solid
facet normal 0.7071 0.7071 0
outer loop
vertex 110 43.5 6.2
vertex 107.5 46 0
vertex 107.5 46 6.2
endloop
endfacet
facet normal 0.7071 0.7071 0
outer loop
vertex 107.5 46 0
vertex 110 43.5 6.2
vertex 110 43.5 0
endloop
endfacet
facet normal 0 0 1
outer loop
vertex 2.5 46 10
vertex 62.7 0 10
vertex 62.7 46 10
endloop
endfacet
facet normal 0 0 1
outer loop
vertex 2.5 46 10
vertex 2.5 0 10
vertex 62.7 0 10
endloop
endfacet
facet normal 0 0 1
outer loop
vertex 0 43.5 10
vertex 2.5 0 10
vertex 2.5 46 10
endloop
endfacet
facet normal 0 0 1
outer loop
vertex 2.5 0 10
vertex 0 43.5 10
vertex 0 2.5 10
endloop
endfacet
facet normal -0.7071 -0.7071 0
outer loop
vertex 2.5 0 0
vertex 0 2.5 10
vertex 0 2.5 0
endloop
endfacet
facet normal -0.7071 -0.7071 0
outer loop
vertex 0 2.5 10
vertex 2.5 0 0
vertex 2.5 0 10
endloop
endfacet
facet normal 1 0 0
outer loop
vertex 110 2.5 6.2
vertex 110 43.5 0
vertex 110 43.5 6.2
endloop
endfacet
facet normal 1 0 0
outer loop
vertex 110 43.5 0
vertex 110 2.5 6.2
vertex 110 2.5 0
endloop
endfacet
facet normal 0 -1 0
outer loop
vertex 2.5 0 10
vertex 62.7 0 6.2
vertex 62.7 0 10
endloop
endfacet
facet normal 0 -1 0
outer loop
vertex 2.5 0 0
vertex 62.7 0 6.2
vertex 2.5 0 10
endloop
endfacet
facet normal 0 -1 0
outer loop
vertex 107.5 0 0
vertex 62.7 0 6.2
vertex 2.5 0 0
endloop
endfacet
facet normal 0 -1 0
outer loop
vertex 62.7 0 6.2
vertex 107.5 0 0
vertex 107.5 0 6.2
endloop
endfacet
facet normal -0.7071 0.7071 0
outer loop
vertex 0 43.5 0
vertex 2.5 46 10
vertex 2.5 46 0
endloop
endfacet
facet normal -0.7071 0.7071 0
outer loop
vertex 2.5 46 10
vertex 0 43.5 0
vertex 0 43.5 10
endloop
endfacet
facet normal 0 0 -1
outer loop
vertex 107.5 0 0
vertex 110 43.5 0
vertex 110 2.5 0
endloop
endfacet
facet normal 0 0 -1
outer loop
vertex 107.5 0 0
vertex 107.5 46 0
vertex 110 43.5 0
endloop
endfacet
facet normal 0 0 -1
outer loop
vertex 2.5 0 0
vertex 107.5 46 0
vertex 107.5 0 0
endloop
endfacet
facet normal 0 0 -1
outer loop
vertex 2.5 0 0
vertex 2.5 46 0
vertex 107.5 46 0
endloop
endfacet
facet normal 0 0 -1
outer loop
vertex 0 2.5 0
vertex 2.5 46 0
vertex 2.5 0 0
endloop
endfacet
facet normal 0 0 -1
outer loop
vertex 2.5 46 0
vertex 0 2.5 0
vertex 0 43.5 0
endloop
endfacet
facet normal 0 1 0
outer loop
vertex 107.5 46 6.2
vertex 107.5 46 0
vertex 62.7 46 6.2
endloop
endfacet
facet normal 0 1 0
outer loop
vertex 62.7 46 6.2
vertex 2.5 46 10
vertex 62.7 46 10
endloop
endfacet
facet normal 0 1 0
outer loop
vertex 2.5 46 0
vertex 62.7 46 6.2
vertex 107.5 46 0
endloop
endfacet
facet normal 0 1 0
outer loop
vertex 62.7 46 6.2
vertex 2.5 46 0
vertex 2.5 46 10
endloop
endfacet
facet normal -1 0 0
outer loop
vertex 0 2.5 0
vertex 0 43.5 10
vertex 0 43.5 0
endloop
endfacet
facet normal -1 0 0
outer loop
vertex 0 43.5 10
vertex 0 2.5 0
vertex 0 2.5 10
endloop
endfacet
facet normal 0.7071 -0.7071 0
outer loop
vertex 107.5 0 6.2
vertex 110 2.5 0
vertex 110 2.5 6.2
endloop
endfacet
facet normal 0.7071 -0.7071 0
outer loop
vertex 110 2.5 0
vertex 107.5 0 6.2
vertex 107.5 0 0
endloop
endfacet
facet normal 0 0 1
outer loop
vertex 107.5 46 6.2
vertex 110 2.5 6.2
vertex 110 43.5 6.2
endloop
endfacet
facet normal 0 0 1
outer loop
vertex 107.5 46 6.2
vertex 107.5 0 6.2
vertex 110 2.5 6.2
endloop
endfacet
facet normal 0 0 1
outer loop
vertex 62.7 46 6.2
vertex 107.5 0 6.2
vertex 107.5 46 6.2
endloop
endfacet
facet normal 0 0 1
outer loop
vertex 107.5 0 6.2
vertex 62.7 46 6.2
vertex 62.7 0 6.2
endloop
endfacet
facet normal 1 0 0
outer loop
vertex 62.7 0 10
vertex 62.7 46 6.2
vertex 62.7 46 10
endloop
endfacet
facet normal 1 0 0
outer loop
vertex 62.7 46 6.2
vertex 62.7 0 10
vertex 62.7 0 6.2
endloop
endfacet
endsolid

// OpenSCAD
$fn = 32;

// ----------------------------------------------------------------------
// Stepped bar: endstep, 110 x 46 x 10/6.2 mm
// ----------------------------------------------------------------------

// --- parameters (mm) ---
bar_l = 110;              // bar length, X
bar_w = 46;               // bar width, Y
plate_t = 10;             // thickness of the thick zone, Z
thin_t = 6.2;             // thickness of the thin zone
corner_c = 2.5;           // corner chamfer of the bar
step_cut = 3.8;           // material removed from the thin zone
step_x = 62.7;            // step position from the left end
depth_1 = 3.8;            // depth of cut 1 from the top face

profile = [[2.5, 0], [107.5, 0], [110, 2.5], [110, 43.5], [107.5, 46], [2.5, 46], [0, 43.5], [0, 2.5]];  // primary outline, 8 points, counter clockwise
void_1 = [[62.7, -1], [111, -1], [111, 47], [62.7, 47]];  // thin zone beyond the step, 4 points

// --- the one profile operation ---
difference() {
  linear_extrude(height = plate_t) polygon(points = profile);
  translate([0, 0, plate_t - depth_1])
    linear_extrude(height = depth_1 + 1) polygon(points = void_1);
}
